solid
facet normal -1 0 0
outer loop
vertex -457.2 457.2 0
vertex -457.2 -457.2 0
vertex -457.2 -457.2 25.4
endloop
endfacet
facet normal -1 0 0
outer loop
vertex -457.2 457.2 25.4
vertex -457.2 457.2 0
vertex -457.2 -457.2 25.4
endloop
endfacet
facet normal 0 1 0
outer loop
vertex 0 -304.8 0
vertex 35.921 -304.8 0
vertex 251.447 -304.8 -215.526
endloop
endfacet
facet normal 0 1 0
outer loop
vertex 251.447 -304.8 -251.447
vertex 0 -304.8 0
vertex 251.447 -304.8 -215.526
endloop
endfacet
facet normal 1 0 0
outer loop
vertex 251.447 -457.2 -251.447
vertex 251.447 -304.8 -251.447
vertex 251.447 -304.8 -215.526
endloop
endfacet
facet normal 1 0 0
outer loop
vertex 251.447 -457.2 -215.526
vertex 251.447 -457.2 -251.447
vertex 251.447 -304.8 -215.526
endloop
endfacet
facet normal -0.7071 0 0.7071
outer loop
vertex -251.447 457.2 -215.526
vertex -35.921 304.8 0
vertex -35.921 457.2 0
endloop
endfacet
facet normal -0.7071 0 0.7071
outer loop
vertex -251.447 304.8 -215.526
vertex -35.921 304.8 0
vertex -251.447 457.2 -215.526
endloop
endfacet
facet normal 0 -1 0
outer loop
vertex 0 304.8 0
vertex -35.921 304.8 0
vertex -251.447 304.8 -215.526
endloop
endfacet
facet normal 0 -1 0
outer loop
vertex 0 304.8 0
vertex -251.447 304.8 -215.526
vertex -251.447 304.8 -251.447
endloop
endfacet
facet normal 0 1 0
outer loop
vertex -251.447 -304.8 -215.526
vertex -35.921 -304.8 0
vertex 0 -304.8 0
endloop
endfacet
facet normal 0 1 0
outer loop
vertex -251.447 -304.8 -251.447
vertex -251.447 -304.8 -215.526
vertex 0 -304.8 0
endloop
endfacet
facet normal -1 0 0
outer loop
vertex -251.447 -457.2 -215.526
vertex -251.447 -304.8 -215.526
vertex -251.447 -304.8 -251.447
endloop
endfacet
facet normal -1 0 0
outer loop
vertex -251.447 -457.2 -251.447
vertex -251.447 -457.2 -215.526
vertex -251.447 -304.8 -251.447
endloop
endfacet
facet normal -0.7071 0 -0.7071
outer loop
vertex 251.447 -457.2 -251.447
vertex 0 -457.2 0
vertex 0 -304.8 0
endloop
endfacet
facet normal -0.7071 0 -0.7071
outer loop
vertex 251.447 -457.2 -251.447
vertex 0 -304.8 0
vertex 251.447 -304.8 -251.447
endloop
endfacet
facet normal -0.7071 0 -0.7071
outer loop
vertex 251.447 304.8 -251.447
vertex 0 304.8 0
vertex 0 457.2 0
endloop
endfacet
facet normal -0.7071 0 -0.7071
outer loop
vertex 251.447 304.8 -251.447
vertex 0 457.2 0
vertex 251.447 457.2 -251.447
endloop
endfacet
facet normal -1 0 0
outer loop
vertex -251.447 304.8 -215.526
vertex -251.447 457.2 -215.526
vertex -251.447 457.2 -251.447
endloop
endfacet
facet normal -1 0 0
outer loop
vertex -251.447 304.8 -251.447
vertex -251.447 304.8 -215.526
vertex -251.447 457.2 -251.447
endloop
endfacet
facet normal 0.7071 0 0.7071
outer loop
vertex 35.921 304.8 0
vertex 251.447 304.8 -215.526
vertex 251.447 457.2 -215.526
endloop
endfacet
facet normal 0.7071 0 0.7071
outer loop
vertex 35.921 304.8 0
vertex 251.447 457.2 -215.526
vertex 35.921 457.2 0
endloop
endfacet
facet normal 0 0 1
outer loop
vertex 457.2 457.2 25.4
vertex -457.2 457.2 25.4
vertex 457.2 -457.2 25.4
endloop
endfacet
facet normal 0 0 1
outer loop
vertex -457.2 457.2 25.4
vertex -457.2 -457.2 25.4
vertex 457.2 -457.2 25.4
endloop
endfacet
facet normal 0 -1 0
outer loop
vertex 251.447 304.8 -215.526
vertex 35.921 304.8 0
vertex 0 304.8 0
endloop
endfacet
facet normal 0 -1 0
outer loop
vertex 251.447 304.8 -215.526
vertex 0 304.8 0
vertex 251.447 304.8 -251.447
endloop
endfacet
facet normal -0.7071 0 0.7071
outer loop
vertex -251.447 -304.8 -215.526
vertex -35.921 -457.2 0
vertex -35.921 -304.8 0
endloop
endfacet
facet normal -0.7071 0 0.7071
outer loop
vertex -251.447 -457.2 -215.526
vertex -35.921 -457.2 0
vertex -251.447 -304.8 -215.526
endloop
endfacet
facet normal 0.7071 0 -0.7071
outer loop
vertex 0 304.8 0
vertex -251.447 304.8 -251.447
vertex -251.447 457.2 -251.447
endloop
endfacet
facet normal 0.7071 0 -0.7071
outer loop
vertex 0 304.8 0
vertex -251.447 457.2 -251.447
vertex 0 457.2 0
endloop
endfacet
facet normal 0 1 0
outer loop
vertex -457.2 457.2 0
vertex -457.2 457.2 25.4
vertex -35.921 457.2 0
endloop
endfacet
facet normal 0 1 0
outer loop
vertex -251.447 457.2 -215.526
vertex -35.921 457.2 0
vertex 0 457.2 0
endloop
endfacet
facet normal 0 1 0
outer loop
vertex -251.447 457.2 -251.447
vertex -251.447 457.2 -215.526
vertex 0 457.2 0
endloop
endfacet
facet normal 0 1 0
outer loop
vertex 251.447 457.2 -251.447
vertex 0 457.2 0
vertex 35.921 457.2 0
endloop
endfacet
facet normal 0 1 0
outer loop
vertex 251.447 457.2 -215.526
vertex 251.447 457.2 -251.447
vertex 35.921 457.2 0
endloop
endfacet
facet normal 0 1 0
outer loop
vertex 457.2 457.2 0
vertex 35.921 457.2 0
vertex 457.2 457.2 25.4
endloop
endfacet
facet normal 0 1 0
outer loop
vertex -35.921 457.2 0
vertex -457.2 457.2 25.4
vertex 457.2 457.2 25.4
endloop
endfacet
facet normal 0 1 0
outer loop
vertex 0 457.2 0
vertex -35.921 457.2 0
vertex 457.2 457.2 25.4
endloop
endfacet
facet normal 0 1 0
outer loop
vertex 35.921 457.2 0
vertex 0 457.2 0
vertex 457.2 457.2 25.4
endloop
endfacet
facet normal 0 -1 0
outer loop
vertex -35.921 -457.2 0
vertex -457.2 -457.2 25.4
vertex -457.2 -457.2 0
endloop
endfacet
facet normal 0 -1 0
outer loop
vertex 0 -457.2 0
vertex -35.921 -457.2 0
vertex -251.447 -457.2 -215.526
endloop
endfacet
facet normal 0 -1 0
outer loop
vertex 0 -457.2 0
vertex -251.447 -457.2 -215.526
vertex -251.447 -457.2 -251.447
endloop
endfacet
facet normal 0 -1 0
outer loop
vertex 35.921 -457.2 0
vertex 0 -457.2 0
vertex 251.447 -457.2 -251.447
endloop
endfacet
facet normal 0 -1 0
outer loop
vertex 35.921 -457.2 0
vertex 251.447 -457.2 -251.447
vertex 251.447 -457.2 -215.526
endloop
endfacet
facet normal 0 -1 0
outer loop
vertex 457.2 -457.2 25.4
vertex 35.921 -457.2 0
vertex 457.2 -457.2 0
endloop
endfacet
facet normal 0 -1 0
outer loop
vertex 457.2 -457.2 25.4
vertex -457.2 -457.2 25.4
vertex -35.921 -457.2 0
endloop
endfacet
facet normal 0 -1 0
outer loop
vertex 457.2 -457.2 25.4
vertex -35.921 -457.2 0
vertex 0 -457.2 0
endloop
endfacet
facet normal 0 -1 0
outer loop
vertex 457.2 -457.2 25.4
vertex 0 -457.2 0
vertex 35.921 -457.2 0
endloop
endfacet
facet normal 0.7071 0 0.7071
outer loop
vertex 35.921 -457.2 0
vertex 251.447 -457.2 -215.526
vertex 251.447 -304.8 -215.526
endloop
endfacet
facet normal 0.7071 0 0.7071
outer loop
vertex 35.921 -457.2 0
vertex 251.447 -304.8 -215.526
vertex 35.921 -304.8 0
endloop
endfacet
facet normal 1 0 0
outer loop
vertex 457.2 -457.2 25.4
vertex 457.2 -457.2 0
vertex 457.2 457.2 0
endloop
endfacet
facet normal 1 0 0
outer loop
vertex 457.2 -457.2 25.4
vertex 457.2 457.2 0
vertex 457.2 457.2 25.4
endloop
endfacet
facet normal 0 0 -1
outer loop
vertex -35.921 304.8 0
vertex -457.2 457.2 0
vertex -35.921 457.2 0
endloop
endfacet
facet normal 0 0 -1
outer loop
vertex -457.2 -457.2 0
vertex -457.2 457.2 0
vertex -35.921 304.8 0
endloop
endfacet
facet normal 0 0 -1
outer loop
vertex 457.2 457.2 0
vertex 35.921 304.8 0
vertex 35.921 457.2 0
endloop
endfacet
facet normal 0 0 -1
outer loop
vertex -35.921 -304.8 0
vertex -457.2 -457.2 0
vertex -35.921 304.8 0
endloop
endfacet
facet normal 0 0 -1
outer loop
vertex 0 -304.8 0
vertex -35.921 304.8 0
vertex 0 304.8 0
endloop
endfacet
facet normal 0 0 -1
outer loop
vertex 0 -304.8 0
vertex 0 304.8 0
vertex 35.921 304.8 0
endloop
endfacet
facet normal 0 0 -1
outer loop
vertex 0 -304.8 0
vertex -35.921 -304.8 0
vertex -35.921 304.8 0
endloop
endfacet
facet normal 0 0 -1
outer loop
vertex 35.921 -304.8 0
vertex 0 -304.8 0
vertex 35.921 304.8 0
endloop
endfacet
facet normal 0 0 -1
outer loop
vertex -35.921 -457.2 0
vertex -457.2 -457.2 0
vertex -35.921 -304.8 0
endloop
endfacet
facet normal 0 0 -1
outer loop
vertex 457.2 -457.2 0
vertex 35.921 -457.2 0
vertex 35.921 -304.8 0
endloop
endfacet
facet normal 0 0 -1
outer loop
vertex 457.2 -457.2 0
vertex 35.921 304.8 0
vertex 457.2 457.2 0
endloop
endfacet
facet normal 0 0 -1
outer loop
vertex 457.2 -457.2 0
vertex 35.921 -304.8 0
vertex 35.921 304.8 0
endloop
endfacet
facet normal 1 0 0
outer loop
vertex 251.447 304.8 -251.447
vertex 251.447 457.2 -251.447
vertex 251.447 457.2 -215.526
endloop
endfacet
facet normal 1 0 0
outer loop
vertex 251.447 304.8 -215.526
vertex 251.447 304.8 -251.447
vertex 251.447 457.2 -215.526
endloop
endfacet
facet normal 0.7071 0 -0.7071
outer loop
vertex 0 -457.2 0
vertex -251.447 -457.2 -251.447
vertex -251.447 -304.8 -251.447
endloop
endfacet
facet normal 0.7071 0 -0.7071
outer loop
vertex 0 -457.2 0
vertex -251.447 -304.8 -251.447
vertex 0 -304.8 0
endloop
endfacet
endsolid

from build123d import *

# Parameters (mm, degrees)
F0_W     = 914.4
F0_H     = 25.4
F2_DEPTH = 457.2
F3_DEPTH = 457.2
F5_DEPTH = 304.8


with BuildPart() as f2:
    # F0 (on Front) → F2 (new body, symmetric)
    with BuildSketch(Plane.XZ):
        with Locations((0, 12.7)):
            Rectangle(F0_W, F0_H)
    extrude(amount=F2_DEPTH, both=True)

    # F1 (on Front) → F3 (join, symmetric)
    with BuildSketch(Plane.XZ):
        Polygon((0, 0), (-35.921024, 0), (-251.447171, -215.526147), (-251.447171, -251.447171), align=None)
        Polygon((35.921024, 0), (0, 0), (251.447171, -251.447171), (251.447171, -215.526147), align=None)
    extrude(amount=F3_DEPTH, both=True)

    # F4 (on Front) → F5 (cut, symmetric)
    with BuildSketch(Plane.XZ):
        Polygon((0, 0), (-35.921024, 0), (-251.447171, -215.526147), (-251.447171, -251.447171), align=None)
        Polygon((35.921024, 0), (0, 0), (251.447171, -251.447171), (251.447171, -215.526147), align=None)
    extrude(amount=F5_DEPTH, both=True, mode=Mode.SUBTRACT)


solid = f2.part
